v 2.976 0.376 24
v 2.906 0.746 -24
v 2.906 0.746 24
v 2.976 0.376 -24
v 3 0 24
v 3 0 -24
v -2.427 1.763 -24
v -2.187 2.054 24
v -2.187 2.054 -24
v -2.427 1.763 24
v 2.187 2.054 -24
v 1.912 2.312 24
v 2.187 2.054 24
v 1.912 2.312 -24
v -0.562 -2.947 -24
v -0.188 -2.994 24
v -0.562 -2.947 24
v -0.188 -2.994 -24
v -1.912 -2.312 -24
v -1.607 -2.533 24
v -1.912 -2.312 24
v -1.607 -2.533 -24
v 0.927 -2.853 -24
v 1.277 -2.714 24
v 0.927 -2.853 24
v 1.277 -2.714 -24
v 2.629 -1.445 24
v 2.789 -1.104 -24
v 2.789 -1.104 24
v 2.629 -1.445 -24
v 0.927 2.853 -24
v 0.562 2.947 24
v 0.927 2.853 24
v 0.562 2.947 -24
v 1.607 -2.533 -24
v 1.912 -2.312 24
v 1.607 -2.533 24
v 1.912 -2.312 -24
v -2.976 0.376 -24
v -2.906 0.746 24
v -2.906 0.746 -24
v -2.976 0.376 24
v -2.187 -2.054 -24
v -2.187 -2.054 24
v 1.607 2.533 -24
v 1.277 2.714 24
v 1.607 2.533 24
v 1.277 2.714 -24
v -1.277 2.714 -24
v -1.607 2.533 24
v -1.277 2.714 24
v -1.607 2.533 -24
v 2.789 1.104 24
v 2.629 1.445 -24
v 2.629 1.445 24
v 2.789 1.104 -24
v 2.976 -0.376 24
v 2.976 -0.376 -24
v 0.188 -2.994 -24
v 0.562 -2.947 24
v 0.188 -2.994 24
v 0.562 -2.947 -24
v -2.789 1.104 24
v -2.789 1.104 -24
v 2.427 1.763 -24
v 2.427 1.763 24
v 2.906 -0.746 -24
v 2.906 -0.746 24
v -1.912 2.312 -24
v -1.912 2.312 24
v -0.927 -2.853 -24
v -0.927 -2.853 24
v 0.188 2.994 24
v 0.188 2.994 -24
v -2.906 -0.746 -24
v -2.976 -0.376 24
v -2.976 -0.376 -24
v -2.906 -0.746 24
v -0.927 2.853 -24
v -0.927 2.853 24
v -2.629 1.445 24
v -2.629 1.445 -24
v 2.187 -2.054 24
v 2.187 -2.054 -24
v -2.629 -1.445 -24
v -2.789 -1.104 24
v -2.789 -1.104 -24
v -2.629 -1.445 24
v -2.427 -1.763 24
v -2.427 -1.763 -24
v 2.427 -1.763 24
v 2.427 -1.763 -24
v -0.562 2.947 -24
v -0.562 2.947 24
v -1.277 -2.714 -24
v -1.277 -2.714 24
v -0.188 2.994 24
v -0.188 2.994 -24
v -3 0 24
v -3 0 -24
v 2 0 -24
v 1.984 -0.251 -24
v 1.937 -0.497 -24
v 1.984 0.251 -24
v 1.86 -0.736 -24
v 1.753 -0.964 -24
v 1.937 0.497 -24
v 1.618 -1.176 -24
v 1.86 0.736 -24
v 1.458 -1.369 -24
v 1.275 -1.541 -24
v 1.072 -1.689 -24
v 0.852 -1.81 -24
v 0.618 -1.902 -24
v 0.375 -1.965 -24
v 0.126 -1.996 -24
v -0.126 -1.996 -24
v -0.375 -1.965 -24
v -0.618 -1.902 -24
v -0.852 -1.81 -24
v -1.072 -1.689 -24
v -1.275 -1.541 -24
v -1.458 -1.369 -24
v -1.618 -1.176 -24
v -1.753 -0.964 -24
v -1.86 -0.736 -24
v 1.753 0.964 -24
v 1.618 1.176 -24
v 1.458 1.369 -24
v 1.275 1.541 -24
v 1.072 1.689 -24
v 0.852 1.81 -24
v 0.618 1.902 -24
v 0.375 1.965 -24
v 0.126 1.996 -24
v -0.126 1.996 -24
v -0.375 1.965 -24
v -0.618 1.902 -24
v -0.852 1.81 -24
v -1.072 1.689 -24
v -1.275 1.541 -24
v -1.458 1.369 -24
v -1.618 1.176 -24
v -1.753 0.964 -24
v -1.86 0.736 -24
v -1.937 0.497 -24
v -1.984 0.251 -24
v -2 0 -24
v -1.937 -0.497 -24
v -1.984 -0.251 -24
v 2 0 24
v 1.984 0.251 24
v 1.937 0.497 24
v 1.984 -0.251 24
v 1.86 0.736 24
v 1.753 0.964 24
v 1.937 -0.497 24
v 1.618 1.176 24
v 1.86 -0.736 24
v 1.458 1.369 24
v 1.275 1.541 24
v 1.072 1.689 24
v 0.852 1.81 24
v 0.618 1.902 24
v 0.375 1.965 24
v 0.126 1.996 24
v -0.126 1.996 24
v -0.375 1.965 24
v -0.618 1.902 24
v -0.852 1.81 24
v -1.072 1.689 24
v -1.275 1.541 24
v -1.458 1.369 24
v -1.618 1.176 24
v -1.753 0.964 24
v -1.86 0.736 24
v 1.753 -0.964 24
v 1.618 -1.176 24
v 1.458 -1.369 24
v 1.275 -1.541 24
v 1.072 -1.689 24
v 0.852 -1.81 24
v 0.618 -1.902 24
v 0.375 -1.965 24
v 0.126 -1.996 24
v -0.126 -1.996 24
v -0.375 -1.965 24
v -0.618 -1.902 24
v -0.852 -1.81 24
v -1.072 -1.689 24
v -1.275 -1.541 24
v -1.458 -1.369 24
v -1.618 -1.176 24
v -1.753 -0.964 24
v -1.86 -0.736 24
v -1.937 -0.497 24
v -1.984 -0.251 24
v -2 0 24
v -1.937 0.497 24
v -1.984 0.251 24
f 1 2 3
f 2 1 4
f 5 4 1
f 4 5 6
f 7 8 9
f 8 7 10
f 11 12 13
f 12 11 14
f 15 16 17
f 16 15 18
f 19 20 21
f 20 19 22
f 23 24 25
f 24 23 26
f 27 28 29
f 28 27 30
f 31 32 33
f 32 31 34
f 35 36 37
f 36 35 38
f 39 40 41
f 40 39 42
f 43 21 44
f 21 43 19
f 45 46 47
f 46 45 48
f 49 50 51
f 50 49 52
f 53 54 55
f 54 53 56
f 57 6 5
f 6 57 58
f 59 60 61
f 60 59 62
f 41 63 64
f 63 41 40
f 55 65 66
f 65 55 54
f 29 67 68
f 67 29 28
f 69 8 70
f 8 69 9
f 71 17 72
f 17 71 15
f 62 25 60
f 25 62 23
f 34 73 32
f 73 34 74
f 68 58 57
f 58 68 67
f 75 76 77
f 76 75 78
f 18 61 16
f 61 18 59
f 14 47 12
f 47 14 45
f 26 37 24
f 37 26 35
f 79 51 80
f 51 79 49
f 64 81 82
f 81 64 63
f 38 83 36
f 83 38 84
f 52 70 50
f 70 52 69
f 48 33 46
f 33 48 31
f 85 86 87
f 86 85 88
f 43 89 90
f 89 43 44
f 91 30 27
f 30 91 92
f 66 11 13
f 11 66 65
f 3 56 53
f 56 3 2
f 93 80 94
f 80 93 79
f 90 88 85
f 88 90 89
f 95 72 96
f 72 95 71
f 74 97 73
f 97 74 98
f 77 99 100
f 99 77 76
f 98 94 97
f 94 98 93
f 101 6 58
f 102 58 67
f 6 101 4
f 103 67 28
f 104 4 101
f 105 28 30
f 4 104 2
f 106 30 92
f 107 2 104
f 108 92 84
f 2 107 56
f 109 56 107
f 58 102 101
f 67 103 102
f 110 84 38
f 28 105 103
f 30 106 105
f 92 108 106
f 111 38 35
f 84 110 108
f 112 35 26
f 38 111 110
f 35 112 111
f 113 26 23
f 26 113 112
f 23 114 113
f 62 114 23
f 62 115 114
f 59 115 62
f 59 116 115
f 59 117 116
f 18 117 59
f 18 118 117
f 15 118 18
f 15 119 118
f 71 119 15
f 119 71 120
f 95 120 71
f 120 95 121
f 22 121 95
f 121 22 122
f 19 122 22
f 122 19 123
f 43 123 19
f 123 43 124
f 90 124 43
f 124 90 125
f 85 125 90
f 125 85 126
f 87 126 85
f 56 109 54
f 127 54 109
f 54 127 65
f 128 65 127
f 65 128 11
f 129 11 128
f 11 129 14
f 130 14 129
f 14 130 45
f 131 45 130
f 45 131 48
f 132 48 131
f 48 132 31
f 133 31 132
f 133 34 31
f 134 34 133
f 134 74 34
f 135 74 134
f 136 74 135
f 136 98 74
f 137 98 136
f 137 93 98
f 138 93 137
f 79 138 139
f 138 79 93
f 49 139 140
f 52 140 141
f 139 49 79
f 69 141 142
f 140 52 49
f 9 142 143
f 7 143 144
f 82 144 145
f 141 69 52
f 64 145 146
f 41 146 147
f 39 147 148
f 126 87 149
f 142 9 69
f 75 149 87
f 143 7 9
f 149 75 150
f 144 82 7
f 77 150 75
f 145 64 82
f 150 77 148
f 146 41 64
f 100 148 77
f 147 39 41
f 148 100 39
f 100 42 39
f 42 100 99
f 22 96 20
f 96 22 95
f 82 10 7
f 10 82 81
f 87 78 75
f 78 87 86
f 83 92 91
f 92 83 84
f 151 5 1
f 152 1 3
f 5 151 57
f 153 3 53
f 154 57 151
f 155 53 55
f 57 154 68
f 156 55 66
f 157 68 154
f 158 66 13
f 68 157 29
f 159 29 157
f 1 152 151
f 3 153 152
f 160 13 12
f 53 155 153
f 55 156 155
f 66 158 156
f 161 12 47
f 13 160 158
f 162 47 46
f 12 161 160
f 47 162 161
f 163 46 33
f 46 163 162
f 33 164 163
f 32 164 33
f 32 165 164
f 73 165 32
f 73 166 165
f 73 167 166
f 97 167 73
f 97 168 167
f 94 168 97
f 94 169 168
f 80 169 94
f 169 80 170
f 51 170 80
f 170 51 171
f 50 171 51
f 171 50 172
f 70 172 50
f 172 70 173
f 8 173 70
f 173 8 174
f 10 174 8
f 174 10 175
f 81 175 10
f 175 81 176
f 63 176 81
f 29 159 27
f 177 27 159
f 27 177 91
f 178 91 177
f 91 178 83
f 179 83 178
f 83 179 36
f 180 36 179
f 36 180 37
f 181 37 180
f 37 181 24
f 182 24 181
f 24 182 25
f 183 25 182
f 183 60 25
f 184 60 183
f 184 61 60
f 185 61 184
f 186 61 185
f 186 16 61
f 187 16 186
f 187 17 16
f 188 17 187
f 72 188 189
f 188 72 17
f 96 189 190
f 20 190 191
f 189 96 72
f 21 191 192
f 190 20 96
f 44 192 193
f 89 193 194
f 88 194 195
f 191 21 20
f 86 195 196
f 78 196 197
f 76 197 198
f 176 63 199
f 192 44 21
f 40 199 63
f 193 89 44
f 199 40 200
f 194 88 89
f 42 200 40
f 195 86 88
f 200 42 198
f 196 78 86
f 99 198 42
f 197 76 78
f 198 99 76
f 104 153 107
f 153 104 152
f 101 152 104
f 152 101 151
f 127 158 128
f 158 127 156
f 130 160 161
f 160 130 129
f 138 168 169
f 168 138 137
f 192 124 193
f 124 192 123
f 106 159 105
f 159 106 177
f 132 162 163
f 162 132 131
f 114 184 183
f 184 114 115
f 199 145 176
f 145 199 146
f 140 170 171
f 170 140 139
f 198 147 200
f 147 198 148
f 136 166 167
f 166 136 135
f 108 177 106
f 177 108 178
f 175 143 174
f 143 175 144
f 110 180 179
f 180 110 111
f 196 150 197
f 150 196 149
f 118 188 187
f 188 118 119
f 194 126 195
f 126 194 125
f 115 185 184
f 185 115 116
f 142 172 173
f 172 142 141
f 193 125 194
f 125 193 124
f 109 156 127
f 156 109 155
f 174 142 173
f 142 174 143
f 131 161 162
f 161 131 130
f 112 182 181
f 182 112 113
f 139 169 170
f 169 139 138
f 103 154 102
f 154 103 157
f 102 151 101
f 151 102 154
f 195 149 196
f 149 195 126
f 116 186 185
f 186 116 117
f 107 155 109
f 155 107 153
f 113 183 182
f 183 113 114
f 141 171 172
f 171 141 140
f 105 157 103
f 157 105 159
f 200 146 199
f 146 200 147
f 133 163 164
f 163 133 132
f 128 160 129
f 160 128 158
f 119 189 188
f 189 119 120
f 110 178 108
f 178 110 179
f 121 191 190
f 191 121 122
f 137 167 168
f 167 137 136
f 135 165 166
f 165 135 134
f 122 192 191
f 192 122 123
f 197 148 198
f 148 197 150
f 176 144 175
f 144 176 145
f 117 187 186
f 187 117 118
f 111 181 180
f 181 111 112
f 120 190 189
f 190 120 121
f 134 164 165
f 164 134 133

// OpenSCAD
$fn = 50;


difference() {
	union() {
		translate(v = [0, 0, -24.0000000000]) {
			cylinder(h = 48, r = 3.0000000000);
		}
	}
	union() {
		translate(v = [0, 0, -100.0000000000]) {
			cylinder(h = 200, r = 2.0000000000);
		}
	}
}
